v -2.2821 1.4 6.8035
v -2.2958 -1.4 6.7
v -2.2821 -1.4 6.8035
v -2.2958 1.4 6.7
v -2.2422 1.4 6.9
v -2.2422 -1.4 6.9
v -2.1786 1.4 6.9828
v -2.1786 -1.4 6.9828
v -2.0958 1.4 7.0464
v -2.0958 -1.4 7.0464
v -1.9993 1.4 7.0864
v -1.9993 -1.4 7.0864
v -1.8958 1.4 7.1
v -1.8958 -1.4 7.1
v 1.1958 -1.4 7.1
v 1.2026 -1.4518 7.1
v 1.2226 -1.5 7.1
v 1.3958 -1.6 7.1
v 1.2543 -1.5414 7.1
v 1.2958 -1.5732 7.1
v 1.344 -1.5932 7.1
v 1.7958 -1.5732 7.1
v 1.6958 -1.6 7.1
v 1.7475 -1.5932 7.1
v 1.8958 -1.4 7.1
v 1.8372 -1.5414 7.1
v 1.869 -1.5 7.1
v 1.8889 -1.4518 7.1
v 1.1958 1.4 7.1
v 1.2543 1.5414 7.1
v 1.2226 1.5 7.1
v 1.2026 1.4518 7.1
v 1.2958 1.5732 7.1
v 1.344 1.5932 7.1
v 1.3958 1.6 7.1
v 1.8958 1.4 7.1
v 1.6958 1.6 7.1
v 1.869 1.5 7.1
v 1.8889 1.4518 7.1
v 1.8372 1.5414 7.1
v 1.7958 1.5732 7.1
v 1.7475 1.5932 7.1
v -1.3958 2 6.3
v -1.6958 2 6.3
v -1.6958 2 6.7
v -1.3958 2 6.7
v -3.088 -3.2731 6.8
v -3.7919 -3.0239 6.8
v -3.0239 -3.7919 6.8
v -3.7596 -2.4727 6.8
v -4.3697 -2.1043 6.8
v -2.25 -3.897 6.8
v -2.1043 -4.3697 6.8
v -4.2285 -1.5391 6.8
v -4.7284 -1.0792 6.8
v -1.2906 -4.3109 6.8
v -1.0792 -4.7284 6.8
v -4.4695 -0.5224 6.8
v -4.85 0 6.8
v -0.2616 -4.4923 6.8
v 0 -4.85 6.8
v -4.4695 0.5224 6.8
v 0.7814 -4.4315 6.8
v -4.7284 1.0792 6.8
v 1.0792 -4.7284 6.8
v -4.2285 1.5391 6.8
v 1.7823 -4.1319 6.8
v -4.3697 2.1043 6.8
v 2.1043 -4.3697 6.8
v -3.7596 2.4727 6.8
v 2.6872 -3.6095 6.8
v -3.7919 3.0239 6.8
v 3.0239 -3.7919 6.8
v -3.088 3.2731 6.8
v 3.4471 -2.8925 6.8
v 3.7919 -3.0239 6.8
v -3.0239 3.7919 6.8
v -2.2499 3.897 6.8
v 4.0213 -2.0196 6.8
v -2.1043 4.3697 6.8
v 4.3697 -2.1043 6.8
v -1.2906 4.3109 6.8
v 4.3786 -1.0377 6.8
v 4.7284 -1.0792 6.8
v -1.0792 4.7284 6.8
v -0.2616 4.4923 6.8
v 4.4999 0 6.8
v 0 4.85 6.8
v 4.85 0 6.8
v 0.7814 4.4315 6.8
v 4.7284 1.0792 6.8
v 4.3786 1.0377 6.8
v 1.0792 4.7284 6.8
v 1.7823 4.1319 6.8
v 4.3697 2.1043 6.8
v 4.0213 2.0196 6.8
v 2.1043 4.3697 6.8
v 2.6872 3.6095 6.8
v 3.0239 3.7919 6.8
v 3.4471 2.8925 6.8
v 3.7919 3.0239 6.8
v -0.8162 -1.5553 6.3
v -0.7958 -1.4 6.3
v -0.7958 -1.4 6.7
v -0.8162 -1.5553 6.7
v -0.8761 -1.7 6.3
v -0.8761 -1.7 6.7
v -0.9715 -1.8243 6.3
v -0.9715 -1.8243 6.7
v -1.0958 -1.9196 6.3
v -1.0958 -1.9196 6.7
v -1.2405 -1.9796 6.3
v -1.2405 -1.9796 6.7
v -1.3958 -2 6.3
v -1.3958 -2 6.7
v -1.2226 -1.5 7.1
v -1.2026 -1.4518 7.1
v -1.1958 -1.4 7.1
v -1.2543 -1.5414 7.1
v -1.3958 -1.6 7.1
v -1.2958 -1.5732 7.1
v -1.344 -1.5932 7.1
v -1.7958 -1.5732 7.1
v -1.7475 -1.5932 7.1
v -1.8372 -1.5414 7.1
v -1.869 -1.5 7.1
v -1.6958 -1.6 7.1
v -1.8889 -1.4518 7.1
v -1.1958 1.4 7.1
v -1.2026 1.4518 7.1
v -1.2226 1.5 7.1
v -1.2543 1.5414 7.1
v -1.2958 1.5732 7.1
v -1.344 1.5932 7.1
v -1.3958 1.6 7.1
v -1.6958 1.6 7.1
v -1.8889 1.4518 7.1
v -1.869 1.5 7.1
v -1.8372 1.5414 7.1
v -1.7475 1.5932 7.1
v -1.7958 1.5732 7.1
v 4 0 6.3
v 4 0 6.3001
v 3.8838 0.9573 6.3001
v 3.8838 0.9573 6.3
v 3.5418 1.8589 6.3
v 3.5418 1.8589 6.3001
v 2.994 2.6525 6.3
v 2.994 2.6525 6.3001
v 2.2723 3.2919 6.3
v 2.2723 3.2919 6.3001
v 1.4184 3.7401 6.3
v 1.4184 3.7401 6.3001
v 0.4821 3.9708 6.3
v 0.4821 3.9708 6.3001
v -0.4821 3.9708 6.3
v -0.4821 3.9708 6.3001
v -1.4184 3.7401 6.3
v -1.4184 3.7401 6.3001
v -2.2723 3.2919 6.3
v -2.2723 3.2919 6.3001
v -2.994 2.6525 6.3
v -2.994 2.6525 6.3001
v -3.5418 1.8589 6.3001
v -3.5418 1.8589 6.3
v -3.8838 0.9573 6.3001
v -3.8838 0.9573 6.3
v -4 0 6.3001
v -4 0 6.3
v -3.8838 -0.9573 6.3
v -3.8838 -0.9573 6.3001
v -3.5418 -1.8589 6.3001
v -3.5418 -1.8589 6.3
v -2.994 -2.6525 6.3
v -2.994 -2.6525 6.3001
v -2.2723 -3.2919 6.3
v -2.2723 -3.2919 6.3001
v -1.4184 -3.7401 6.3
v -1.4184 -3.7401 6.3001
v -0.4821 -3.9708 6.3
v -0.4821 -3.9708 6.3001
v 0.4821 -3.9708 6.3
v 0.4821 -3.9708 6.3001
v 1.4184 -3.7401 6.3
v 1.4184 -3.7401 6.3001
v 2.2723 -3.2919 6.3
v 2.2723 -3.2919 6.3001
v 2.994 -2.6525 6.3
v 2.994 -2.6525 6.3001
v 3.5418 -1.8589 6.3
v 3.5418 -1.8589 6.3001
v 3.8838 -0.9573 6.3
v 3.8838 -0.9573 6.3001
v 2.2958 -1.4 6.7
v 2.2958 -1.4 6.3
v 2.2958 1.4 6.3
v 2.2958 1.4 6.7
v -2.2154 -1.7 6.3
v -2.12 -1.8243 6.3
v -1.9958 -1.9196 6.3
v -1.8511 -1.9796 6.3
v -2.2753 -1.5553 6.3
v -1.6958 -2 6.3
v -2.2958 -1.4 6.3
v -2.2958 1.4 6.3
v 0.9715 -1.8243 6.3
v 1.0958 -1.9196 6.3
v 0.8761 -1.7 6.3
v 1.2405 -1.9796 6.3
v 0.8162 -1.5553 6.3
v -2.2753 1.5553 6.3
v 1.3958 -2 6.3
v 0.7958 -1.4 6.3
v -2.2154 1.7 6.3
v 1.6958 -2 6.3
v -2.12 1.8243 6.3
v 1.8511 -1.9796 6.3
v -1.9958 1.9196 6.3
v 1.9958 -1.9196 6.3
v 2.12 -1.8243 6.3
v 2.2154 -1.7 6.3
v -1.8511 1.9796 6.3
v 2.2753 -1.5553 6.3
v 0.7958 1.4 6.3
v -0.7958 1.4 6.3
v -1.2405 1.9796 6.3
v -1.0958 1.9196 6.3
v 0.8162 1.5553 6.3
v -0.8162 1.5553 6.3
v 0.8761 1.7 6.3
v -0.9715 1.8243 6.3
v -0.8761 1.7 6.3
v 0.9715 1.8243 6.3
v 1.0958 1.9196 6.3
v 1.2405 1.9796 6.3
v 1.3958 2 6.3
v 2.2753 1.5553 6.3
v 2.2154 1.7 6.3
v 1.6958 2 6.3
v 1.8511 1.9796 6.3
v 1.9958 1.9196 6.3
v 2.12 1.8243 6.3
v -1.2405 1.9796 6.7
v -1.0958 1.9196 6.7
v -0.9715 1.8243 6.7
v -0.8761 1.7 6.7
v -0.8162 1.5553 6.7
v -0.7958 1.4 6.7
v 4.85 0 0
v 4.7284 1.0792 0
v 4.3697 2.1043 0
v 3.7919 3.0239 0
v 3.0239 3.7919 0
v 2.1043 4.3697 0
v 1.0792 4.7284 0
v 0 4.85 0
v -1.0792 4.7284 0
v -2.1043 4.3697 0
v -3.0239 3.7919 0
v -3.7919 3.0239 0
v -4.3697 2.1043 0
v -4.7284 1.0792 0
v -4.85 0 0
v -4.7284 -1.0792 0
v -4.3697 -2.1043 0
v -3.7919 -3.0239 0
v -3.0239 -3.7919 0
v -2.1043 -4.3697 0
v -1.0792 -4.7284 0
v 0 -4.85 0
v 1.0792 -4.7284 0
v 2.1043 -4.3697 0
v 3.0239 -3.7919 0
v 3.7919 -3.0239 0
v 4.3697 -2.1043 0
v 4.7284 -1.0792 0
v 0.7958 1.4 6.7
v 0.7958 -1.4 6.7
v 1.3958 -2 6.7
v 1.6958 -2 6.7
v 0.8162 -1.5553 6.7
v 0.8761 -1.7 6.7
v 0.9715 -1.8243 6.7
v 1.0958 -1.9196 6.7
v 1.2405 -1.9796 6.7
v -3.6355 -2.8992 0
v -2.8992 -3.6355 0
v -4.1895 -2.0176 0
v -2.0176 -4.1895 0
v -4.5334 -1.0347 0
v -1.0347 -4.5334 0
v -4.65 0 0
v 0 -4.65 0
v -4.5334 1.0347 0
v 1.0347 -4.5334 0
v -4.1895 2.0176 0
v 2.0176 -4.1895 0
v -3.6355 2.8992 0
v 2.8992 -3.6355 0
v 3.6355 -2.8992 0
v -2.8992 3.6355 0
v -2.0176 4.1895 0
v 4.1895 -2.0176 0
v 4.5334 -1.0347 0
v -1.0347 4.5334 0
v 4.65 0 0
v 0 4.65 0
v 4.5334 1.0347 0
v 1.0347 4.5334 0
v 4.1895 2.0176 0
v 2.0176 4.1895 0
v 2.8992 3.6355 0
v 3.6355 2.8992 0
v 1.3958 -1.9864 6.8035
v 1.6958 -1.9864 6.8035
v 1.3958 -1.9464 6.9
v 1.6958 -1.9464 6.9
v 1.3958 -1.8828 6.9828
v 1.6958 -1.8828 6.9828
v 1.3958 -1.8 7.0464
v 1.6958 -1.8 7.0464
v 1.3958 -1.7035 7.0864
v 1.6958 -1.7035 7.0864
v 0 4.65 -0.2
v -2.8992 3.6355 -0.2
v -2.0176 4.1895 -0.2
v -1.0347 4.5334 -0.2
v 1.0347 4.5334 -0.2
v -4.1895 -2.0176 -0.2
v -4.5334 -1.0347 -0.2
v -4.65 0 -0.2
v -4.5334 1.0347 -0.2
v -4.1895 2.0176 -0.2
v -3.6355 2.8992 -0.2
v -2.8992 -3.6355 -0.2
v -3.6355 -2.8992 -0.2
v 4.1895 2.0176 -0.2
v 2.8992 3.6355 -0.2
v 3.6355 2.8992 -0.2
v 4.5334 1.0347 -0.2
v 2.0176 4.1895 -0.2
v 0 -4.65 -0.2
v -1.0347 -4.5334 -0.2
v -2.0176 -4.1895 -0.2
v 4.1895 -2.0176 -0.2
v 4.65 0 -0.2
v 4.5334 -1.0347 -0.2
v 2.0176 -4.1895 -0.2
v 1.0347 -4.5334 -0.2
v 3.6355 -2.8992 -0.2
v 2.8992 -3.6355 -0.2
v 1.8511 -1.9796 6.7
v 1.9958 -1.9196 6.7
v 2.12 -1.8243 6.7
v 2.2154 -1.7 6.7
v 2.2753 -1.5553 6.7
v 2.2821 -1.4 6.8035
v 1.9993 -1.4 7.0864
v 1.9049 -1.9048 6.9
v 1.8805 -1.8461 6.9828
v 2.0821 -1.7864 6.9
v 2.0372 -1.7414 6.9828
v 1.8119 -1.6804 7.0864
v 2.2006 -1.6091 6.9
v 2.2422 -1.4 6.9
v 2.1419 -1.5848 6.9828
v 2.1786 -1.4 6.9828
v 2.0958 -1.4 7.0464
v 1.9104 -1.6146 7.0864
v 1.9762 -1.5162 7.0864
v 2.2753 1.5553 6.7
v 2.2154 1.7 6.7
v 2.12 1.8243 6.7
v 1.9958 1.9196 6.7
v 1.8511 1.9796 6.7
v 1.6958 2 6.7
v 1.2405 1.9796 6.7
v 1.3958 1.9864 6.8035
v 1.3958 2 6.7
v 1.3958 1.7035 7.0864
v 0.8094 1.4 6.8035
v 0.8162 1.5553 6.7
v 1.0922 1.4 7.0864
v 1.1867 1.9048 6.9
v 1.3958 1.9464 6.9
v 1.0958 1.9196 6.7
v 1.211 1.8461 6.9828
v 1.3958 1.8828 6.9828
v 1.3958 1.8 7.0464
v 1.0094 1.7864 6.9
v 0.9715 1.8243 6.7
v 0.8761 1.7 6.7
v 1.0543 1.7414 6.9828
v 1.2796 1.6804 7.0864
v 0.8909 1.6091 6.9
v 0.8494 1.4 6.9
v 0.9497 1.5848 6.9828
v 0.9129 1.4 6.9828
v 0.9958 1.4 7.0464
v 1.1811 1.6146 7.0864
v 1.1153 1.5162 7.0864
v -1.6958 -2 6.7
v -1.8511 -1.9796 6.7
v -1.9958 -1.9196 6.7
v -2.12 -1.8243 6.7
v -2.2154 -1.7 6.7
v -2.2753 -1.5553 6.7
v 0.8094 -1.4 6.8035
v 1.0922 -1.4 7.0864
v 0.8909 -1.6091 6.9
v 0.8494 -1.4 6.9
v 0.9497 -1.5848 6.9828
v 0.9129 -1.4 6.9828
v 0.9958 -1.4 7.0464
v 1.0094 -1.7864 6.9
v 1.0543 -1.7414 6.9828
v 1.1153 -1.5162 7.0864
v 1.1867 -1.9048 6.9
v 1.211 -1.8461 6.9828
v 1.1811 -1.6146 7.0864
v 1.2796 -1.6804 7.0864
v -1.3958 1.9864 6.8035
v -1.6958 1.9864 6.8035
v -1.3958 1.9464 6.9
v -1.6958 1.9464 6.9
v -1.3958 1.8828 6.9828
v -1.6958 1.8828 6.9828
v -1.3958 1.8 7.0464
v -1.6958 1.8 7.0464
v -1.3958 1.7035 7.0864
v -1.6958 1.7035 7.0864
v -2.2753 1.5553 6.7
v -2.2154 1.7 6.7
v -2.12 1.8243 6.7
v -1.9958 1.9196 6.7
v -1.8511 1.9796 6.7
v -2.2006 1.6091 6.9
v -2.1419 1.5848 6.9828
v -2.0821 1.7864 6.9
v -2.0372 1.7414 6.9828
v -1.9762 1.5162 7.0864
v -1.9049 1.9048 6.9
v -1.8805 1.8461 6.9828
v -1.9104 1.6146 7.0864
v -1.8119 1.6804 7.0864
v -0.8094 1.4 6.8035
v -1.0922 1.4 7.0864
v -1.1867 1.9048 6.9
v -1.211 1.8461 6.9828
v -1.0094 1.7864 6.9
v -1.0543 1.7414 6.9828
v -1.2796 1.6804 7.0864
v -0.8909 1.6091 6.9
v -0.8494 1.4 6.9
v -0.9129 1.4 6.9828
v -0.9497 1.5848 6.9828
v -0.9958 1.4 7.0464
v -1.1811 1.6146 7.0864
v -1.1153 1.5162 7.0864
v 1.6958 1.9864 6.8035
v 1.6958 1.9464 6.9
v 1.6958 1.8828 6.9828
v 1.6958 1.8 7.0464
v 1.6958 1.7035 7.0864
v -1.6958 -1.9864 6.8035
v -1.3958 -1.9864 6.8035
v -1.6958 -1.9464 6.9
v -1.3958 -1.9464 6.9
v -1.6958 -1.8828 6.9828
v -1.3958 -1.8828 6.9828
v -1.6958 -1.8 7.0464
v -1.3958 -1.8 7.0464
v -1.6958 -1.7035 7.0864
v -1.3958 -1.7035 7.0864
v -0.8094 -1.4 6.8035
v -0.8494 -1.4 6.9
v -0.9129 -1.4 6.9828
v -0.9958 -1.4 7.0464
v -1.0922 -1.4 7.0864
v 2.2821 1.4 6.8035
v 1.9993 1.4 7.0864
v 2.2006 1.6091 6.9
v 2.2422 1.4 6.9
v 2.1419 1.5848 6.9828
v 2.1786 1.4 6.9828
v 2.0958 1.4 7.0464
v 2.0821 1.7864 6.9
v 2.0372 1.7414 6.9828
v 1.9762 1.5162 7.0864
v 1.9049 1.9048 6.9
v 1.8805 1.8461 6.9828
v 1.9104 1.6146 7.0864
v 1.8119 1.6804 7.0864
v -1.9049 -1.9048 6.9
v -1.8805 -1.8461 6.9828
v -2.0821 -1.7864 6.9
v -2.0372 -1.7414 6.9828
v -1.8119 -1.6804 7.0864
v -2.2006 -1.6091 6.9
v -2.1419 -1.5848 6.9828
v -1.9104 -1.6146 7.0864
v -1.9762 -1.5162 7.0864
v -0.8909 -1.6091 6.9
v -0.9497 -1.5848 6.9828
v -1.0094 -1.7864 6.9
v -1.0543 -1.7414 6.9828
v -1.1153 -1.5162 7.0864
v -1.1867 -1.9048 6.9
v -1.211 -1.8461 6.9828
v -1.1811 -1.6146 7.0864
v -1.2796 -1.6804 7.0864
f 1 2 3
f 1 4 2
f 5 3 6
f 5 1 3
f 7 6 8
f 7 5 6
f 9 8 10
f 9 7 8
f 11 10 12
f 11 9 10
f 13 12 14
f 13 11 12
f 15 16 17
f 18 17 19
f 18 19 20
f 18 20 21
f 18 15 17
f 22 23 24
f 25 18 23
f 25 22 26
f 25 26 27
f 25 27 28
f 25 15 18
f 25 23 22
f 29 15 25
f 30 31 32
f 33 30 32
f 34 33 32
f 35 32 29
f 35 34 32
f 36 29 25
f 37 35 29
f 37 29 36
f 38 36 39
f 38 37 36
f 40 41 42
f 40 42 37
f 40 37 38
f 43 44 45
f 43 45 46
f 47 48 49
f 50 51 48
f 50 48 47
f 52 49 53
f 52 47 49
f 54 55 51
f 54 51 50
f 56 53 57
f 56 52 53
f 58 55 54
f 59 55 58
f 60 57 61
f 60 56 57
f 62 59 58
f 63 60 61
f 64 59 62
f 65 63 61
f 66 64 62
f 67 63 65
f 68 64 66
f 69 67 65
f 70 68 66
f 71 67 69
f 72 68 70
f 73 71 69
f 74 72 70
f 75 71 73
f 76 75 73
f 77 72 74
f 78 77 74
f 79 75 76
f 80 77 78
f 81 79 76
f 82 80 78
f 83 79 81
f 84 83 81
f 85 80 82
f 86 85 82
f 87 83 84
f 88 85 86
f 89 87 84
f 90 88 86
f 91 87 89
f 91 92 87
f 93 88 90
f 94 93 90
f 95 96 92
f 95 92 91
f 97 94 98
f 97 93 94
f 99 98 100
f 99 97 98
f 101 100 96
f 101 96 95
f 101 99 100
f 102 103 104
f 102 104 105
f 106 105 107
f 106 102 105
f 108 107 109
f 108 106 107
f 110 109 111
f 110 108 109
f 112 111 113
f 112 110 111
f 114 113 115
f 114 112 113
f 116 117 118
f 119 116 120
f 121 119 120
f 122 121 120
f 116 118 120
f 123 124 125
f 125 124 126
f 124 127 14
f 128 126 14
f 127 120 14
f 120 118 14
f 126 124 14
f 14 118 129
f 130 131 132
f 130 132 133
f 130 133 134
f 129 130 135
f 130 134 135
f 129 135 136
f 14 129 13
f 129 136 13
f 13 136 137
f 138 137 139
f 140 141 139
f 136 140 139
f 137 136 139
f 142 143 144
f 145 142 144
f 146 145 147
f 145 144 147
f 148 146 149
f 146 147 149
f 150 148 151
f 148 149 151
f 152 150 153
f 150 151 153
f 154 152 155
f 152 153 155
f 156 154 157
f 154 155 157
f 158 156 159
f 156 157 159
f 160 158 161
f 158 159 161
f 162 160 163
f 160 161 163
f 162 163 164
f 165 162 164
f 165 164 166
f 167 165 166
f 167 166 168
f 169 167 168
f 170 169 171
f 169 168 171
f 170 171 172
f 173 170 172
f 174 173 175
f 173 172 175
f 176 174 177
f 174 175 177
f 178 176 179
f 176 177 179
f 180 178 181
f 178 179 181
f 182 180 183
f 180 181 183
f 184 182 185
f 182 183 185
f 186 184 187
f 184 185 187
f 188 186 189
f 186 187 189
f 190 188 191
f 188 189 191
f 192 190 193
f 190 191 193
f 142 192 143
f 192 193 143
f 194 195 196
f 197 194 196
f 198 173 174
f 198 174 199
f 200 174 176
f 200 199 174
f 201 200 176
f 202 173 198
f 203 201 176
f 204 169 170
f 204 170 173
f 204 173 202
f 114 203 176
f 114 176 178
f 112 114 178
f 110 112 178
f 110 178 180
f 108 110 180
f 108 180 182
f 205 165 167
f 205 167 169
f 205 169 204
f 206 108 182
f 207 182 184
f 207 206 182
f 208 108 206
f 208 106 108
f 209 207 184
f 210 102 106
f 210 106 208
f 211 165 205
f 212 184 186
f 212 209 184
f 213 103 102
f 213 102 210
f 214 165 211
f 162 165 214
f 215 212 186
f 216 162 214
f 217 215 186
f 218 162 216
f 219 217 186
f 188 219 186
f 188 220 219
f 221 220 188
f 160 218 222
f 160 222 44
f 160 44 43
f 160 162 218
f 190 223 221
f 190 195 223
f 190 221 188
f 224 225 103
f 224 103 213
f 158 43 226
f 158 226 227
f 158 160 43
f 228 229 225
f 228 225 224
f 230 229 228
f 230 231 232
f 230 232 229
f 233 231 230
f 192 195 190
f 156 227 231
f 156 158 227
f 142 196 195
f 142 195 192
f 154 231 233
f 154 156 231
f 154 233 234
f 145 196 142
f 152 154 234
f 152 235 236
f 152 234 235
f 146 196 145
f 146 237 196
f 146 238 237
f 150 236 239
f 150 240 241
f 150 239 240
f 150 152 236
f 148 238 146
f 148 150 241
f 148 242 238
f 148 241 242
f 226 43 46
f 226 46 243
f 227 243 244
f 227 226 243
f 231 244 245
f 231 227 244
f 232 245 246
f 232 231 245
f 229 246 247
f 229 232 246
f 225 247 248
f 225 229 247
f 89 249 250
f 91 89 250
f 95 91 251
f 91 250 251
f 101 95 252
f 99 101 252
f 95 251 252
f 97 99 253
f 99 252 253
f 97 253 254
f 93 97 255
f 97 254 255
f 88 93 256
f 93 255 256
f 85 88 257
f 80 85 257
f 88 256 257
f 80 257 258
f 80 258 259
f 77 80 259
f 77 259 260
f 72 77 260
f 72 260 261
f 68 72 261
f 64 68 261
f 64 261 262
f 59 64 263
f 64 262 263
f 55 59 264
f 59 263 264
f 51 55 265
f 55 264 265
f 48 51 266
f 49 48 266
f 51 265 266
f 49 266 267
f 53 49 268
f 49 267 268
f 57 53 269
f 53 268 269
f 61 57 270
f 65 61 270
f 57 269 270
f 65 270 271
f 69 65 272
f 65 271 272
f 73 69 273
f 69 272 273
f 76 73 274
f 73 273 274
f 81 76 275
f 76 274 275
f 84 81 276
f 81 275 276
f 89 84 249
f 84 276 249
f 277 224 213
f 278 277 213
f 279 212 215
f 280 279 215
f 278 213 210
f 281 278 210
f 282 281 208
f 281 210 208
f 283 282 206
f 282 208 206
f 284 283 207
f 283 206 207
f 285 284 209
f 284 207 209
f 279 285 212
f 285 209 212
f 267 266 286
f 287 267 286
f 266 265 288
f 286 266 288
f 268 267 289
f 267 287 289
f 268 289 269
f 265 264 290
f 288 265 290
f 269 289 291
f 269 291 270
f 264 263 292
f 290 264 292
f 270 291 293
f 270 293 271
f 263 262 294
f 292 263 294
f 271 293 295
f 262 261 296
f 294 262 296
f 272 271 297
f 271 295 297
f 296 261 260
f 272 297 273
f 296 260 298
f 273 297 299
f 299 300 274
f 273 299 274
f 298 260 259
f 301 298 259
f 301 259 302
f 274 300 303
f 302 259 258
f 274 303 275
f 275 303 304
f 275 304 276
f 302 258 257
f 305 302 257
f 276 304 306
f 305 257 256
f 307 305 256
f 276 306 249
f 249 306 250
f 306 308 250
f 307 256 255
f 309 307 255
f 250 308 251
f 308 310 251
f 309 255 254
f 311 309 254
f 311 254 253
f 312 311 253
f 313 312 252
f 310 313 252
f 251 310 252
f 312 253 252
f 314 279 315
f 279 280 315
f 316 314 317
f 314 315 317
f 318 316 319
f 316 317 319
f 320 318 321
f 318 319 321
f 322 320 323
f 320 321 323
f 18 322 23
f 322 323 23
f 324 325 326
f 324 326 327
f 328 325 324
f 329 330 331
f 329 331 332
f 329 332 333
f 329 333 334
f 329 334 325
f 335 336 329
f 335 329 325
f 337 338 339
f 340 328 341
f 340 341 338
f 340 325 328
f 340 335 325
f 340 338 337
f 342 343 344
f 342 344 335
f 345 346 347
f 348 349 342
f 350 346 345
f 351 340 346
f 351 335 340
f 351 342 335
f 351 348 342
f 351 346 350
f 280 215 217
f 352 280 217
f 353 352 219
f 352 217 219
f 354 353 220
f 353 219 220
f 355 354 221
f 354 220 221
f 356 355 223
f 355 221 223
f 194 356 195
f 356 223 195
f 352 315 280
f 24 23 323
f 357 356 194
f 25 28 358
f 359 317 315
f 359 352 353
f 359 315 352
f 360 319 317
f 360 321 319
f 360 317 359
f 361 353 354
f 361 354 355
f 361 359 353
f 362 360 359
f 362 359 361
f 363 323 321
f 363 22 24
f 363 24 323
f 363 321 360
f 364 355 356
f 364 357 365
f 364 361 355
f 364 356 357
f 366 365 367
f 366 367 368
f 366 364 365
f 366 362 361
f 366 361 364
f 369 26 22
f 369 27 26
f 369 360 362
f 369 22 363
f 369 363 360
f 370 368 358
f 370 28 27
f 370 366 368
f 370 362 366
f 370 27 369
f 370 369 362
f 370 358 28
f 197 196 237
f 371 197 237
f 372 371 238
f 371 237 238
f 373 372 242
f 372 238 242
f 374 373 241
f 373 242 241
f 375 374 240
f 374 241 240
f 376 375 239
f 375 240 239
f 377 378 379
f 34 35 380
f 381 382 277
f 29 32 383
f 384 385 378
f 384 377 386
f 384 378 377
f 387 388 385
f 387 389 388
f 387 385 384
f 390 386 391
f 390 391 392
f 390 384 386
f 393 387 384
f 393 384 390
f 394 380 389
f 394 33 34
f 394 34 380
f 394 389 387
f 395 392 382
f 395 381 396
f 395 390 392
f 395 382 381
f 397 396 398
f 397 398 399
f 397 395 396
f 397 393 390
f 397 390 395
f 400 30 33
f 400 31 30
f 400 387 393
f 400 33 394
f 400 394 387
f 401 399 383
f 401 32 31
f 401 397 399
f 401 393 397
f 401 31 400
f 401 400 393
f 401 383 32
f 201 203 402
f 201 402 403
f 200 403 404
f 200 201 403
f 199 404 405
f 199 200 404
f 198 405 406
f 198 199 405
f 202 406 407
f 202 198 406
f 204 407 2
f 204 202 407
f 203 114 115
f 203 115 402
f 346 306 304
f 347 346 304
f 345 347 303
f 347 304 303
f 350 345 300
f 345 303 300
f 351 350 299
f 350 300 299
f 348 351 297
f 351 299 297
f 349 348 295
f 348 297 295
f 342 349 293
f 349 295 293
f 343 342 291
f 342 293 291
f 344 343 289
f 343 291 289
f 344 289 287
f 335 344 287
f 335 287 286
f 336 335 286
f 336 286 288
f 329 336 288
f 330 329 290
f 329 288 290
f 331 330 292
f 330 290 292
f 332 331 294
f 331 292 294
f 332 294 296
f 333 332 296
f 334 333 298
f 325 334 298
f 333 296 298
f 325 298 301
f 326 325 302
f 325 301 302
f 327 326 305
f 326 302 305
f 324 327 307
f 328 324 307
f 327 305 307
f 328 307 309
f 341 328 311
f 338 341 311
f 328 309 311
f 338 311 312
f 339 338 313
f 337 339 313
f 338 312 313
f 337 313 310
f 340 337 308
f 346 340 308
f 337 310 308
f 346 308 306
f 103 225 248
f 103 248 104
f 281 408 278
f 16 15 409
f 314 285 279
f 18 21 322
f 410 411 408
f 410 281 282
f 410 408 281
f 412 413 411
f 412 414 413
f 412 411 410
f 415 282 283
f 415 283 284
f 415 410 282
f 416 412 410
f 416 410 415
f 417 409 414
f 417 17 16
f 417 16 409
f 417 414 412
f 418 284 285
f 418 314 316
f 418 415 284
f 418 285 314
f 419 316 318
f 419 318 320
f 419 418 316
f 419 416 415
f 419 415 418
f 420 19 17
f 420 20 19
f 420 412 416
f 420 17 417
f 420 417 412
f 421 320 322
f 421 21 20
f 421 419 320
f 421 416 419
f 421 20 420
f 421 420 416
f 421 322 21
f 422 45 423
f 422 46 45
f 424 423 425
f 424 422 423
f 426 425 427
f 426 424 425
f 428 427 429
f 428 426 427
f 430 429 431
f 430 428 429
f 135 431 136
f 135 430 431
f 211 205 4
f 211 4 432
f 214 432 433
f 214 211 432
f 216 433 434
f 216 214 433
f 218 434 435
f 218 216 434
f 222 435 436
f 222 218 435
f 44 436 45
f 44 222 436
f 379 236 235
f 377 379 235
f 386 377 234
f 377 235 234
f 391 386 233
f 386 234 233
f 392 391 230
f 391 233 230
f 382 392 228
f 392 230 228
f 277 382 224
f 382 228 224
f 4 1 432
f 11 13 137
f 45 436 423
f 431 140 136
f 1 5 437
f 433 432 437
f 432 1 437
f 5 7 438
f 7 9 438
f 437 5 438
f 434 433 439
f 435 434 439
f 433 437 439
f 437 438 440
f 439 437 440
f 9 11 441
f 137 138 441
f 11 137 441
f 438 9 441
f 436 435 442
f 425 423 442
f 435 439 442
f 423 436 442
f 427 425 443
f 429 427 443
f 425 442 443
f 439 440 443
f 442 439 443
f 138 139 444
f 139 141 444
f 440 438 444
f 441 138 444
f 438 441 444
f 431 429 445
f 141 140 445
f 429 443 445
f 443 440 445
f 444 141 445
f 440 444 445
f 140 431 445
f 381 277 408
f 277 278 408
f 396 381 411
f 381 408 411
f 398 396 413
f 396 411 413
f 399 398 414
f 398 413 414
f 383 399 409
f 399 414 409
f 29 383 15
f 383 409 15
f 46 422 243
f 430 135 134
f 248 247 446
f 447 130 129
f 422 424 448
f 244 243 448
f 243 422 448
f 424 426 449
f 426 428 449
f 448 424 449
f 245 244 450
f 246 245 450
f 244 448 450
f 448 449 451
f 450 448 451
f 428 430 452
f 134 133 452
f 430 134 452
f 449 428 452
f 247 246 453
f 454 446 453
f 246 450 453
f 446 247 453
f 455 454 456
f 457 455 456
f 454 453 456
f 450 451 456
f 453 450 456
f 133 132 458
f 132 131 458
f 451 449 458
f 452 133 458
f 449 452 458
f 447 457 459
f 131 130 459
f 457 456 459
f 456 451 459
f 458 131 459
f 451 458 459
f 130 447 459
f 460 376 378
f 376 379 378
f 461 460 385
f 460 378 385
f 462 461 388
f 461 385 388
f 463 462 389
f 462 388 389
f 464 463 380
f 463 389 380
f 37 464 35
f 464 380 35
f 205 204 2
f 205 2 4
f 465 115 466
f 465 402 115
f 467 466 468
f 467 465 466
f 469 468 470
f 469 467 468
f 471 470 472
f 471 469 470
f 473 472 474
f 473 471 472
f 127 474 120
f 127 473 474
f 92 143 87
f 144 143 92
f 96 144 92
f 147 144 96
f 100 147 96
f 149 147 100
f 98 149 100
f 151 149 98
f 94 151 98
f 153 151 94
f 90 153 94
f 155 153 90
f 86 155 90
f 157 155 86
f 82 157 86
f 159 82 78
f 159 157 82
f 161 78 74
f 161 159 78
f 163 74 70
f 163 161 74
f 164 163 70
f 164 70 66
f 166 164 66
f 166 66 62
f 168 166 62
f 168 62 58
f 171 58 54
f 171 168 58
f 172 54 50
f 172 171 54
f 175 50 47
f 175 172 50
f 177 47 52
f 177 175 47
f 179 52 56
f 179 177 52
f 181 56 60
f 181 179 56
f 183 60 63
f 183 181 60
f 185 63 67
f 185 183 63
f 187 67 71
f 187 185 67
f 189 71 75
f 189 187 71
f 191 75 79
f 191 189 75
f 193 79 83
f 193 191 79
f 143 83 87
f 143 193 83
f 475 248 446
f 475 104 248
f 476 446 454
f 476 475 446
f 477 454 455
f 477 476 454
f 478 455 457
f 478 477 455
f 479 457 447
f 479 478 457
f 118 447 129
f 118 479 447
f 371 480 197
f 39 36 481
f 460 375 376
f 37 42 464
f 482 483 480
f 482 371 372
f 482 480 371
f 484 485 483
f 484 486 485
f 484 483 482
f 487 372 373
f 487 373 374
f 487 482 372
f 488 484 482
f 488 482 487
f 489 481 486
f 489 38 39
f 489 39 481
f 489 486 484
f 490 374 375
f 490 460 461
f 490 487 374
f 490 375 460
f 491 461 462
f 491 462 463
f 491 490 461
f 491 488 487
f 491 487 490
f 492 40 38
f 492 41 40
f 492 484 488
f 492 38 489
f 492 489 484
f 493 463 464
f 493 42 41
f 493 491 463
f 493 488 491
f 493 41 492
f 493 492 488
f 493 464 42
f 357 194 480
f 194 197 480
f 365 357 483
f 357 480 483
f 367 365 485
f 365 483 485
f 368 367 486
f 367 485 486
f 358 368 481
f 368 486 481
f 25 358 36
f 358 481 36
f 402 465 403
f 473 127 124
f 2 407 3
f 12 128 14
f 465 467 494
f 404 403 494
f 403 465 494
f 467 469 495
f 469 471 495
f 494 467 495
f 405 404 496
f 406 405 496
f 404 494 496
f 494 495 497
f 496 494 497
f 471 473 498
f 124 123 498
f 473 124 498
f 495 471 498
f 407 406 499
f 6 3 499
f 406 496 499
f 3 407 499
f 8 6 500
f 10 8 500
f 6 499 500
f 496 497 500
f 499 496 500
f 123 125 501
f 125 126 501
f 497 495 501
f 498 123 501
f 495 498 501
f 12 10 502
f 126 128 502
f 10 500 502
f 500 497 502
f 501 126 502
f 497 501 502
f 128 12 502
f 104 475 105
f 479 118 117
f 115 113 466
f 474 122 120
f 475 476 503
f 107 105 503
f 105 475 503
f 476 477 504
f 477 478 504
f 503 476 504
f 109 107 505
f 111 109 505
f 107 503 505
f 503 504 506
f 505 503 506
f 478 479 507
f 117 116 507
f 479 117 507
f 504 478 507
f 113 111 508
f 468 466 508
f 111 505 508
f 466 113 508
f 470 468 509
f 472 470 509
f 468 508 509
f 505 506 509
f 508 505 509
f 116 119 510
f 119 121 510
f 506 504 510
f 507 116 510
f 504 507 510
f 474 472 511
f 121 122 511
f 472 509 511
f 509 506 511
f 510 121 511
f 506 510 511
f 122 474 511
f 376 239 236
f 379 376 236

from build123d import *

# Parameters (mm, degrees)
SKETCH_1_R          = 4.85
EXTRUDE_1_DEPTH     = 6.8
SKETCH_2_R          = 4
CUT_EXTRUDE_1_DEPTH = 0.5
CHAMFER_1_SIZE      = 0.5
EXTRUDE_2_DEPTH     = 0.8
FILLET_1_R          = 0.4
SKETCH_4_R          = 4.65
EXTRUDE_3_DEPTH     = 0.2


with BuildPart() as part:
    # Эскиз1 → Бобышка-Вытянуть1 (new body)
    with BuildSketch(Plane.XY):
        Circle(SKETCH_1_R)
    extrude(amount=EXTRUDE_1_DEPTH)

    # Эскиз2 → Вырез-Вытянуть1 (cut)
    with BuildSketch(Plane.XY.offset(6.8)):
        Circle(SKETCH_2_R)
    extrude(amount=-CUT_EXTRUDE_1_DEPTH, mode=Mode.SUBTRACT)

    # Фаска1
    chamfer_1_edges = [part.edges().sort_by_distance(p)[0] for p in [
        (-4, 0, 6.8),
    ]]
    chamfer(chamfer_1_edges, length=CHAMFER_1_SIZE - 0.0001)  # a hair under: the kernel refuses the full size

    # Эскиз3 → Бобышка-Вытянуть2 (add)
    with BuildSketch(Plane.XY.offset(6.3)):
        with BuildLine():
            Line((-1.695763296, 2), (-1.395763296, 2))
            ThreePointArc((-1.395763296, 2), (-0.971499227, 1.824264069), (-0.795763296, 1.4))
            Line((-0.795763296, 1.4), (-0.795763296, -1.4))
            ThreePointArc((-0.795763296, -1.4), (-0.971499227, -1.824264069), (-1.395763296, -2))
            Line((-1.395763296, -2), (-1.695763296, -2))
            ThreePointArc((-1.695763296, -2), (-2.120027365, -1.824264069), (-2.295763296, -1.4))
            Line((-2.295763296, -1.4), (-2.295763296, 1.4))
            ThreePointArc((-2.295763296, 1.4), (-2.120027365, 1.824264069), (-1.695763296, 2))
        make_face()
        with BuildLine():
            Line((0.795763296, 1.4), (0.795763296, -1.4))
            ThreePointArc((0.795763296, -1.4), (0.971499227, -1.824264069), (1.395763296, -2))
            Line((1.395763296, -2), (1.695763296, -2))
            ThreePointArc((1.695763296, -2), (2.120027365, -1.824264069), (2.295763296, -1.4))
            Line((2.295763296, -1.4), (2.295763296, 1.4))
            ThreePointArc((2.295763296, 1.4), (2.120027365, 1.824264069), (1.695763296, 2))
            Line((1.695763296, 2), (1.395763296, 2))
            ThreePointArc((1.395763296, 2), (0.971499227, 1.824264069), (0.795763296, 1.4))
        make_face()
    extrude(amount=EXTRUDE_2_DEPTH)

    # Скругление1
    fillet_1_edges = [part.edges().sort_by_distance(p)[0] for p in [
        (-2.120027365, -1.824264069, 7.1),
        (-1.545763296, -2, 7.1),
        (-0.971499227, -1.824264069, 7.1),
        (-0.795763296, 0, 7.1),
        (-0.971499227, 1.824264069, 7.1),
        (-1.545763296, 2, 7.1),
        (-2.120027365, 1.824264069, 7.1),
        (-2.295763296, 0, 7.1),
        (2.120027365, 1.824264069, 7.1),
        (1.545763296, 2, 7.1),
        (0.971499227, 1.824264069, 7.1),
        (0.795763296, 0, 7.1),
        (0.971499227, -1.824264069, 7.1),
        (1.545763296, -2, 7.1),
        (2.120027365, -1.824264069, 7.1),
        (2.295763296, 0, 7.1),
    ]]
    fillet(fillet_1_edges, radius=FILLET_1_R)

    # Эскиз4 → Бобышка-Вытянуть3 (add)
    with BuildSketch(Plane(origin=(0, 0, 0), x_dir=(-1, 0, 0), z_dir=(0, 0, -1))):
        with Locations(Location((0, 0, 0), (0, 0, 180))):
            Circle(SKETCH_4_R)
    extrude(amount=EXTRUDE_3_DEPTH)


solid = part.part
